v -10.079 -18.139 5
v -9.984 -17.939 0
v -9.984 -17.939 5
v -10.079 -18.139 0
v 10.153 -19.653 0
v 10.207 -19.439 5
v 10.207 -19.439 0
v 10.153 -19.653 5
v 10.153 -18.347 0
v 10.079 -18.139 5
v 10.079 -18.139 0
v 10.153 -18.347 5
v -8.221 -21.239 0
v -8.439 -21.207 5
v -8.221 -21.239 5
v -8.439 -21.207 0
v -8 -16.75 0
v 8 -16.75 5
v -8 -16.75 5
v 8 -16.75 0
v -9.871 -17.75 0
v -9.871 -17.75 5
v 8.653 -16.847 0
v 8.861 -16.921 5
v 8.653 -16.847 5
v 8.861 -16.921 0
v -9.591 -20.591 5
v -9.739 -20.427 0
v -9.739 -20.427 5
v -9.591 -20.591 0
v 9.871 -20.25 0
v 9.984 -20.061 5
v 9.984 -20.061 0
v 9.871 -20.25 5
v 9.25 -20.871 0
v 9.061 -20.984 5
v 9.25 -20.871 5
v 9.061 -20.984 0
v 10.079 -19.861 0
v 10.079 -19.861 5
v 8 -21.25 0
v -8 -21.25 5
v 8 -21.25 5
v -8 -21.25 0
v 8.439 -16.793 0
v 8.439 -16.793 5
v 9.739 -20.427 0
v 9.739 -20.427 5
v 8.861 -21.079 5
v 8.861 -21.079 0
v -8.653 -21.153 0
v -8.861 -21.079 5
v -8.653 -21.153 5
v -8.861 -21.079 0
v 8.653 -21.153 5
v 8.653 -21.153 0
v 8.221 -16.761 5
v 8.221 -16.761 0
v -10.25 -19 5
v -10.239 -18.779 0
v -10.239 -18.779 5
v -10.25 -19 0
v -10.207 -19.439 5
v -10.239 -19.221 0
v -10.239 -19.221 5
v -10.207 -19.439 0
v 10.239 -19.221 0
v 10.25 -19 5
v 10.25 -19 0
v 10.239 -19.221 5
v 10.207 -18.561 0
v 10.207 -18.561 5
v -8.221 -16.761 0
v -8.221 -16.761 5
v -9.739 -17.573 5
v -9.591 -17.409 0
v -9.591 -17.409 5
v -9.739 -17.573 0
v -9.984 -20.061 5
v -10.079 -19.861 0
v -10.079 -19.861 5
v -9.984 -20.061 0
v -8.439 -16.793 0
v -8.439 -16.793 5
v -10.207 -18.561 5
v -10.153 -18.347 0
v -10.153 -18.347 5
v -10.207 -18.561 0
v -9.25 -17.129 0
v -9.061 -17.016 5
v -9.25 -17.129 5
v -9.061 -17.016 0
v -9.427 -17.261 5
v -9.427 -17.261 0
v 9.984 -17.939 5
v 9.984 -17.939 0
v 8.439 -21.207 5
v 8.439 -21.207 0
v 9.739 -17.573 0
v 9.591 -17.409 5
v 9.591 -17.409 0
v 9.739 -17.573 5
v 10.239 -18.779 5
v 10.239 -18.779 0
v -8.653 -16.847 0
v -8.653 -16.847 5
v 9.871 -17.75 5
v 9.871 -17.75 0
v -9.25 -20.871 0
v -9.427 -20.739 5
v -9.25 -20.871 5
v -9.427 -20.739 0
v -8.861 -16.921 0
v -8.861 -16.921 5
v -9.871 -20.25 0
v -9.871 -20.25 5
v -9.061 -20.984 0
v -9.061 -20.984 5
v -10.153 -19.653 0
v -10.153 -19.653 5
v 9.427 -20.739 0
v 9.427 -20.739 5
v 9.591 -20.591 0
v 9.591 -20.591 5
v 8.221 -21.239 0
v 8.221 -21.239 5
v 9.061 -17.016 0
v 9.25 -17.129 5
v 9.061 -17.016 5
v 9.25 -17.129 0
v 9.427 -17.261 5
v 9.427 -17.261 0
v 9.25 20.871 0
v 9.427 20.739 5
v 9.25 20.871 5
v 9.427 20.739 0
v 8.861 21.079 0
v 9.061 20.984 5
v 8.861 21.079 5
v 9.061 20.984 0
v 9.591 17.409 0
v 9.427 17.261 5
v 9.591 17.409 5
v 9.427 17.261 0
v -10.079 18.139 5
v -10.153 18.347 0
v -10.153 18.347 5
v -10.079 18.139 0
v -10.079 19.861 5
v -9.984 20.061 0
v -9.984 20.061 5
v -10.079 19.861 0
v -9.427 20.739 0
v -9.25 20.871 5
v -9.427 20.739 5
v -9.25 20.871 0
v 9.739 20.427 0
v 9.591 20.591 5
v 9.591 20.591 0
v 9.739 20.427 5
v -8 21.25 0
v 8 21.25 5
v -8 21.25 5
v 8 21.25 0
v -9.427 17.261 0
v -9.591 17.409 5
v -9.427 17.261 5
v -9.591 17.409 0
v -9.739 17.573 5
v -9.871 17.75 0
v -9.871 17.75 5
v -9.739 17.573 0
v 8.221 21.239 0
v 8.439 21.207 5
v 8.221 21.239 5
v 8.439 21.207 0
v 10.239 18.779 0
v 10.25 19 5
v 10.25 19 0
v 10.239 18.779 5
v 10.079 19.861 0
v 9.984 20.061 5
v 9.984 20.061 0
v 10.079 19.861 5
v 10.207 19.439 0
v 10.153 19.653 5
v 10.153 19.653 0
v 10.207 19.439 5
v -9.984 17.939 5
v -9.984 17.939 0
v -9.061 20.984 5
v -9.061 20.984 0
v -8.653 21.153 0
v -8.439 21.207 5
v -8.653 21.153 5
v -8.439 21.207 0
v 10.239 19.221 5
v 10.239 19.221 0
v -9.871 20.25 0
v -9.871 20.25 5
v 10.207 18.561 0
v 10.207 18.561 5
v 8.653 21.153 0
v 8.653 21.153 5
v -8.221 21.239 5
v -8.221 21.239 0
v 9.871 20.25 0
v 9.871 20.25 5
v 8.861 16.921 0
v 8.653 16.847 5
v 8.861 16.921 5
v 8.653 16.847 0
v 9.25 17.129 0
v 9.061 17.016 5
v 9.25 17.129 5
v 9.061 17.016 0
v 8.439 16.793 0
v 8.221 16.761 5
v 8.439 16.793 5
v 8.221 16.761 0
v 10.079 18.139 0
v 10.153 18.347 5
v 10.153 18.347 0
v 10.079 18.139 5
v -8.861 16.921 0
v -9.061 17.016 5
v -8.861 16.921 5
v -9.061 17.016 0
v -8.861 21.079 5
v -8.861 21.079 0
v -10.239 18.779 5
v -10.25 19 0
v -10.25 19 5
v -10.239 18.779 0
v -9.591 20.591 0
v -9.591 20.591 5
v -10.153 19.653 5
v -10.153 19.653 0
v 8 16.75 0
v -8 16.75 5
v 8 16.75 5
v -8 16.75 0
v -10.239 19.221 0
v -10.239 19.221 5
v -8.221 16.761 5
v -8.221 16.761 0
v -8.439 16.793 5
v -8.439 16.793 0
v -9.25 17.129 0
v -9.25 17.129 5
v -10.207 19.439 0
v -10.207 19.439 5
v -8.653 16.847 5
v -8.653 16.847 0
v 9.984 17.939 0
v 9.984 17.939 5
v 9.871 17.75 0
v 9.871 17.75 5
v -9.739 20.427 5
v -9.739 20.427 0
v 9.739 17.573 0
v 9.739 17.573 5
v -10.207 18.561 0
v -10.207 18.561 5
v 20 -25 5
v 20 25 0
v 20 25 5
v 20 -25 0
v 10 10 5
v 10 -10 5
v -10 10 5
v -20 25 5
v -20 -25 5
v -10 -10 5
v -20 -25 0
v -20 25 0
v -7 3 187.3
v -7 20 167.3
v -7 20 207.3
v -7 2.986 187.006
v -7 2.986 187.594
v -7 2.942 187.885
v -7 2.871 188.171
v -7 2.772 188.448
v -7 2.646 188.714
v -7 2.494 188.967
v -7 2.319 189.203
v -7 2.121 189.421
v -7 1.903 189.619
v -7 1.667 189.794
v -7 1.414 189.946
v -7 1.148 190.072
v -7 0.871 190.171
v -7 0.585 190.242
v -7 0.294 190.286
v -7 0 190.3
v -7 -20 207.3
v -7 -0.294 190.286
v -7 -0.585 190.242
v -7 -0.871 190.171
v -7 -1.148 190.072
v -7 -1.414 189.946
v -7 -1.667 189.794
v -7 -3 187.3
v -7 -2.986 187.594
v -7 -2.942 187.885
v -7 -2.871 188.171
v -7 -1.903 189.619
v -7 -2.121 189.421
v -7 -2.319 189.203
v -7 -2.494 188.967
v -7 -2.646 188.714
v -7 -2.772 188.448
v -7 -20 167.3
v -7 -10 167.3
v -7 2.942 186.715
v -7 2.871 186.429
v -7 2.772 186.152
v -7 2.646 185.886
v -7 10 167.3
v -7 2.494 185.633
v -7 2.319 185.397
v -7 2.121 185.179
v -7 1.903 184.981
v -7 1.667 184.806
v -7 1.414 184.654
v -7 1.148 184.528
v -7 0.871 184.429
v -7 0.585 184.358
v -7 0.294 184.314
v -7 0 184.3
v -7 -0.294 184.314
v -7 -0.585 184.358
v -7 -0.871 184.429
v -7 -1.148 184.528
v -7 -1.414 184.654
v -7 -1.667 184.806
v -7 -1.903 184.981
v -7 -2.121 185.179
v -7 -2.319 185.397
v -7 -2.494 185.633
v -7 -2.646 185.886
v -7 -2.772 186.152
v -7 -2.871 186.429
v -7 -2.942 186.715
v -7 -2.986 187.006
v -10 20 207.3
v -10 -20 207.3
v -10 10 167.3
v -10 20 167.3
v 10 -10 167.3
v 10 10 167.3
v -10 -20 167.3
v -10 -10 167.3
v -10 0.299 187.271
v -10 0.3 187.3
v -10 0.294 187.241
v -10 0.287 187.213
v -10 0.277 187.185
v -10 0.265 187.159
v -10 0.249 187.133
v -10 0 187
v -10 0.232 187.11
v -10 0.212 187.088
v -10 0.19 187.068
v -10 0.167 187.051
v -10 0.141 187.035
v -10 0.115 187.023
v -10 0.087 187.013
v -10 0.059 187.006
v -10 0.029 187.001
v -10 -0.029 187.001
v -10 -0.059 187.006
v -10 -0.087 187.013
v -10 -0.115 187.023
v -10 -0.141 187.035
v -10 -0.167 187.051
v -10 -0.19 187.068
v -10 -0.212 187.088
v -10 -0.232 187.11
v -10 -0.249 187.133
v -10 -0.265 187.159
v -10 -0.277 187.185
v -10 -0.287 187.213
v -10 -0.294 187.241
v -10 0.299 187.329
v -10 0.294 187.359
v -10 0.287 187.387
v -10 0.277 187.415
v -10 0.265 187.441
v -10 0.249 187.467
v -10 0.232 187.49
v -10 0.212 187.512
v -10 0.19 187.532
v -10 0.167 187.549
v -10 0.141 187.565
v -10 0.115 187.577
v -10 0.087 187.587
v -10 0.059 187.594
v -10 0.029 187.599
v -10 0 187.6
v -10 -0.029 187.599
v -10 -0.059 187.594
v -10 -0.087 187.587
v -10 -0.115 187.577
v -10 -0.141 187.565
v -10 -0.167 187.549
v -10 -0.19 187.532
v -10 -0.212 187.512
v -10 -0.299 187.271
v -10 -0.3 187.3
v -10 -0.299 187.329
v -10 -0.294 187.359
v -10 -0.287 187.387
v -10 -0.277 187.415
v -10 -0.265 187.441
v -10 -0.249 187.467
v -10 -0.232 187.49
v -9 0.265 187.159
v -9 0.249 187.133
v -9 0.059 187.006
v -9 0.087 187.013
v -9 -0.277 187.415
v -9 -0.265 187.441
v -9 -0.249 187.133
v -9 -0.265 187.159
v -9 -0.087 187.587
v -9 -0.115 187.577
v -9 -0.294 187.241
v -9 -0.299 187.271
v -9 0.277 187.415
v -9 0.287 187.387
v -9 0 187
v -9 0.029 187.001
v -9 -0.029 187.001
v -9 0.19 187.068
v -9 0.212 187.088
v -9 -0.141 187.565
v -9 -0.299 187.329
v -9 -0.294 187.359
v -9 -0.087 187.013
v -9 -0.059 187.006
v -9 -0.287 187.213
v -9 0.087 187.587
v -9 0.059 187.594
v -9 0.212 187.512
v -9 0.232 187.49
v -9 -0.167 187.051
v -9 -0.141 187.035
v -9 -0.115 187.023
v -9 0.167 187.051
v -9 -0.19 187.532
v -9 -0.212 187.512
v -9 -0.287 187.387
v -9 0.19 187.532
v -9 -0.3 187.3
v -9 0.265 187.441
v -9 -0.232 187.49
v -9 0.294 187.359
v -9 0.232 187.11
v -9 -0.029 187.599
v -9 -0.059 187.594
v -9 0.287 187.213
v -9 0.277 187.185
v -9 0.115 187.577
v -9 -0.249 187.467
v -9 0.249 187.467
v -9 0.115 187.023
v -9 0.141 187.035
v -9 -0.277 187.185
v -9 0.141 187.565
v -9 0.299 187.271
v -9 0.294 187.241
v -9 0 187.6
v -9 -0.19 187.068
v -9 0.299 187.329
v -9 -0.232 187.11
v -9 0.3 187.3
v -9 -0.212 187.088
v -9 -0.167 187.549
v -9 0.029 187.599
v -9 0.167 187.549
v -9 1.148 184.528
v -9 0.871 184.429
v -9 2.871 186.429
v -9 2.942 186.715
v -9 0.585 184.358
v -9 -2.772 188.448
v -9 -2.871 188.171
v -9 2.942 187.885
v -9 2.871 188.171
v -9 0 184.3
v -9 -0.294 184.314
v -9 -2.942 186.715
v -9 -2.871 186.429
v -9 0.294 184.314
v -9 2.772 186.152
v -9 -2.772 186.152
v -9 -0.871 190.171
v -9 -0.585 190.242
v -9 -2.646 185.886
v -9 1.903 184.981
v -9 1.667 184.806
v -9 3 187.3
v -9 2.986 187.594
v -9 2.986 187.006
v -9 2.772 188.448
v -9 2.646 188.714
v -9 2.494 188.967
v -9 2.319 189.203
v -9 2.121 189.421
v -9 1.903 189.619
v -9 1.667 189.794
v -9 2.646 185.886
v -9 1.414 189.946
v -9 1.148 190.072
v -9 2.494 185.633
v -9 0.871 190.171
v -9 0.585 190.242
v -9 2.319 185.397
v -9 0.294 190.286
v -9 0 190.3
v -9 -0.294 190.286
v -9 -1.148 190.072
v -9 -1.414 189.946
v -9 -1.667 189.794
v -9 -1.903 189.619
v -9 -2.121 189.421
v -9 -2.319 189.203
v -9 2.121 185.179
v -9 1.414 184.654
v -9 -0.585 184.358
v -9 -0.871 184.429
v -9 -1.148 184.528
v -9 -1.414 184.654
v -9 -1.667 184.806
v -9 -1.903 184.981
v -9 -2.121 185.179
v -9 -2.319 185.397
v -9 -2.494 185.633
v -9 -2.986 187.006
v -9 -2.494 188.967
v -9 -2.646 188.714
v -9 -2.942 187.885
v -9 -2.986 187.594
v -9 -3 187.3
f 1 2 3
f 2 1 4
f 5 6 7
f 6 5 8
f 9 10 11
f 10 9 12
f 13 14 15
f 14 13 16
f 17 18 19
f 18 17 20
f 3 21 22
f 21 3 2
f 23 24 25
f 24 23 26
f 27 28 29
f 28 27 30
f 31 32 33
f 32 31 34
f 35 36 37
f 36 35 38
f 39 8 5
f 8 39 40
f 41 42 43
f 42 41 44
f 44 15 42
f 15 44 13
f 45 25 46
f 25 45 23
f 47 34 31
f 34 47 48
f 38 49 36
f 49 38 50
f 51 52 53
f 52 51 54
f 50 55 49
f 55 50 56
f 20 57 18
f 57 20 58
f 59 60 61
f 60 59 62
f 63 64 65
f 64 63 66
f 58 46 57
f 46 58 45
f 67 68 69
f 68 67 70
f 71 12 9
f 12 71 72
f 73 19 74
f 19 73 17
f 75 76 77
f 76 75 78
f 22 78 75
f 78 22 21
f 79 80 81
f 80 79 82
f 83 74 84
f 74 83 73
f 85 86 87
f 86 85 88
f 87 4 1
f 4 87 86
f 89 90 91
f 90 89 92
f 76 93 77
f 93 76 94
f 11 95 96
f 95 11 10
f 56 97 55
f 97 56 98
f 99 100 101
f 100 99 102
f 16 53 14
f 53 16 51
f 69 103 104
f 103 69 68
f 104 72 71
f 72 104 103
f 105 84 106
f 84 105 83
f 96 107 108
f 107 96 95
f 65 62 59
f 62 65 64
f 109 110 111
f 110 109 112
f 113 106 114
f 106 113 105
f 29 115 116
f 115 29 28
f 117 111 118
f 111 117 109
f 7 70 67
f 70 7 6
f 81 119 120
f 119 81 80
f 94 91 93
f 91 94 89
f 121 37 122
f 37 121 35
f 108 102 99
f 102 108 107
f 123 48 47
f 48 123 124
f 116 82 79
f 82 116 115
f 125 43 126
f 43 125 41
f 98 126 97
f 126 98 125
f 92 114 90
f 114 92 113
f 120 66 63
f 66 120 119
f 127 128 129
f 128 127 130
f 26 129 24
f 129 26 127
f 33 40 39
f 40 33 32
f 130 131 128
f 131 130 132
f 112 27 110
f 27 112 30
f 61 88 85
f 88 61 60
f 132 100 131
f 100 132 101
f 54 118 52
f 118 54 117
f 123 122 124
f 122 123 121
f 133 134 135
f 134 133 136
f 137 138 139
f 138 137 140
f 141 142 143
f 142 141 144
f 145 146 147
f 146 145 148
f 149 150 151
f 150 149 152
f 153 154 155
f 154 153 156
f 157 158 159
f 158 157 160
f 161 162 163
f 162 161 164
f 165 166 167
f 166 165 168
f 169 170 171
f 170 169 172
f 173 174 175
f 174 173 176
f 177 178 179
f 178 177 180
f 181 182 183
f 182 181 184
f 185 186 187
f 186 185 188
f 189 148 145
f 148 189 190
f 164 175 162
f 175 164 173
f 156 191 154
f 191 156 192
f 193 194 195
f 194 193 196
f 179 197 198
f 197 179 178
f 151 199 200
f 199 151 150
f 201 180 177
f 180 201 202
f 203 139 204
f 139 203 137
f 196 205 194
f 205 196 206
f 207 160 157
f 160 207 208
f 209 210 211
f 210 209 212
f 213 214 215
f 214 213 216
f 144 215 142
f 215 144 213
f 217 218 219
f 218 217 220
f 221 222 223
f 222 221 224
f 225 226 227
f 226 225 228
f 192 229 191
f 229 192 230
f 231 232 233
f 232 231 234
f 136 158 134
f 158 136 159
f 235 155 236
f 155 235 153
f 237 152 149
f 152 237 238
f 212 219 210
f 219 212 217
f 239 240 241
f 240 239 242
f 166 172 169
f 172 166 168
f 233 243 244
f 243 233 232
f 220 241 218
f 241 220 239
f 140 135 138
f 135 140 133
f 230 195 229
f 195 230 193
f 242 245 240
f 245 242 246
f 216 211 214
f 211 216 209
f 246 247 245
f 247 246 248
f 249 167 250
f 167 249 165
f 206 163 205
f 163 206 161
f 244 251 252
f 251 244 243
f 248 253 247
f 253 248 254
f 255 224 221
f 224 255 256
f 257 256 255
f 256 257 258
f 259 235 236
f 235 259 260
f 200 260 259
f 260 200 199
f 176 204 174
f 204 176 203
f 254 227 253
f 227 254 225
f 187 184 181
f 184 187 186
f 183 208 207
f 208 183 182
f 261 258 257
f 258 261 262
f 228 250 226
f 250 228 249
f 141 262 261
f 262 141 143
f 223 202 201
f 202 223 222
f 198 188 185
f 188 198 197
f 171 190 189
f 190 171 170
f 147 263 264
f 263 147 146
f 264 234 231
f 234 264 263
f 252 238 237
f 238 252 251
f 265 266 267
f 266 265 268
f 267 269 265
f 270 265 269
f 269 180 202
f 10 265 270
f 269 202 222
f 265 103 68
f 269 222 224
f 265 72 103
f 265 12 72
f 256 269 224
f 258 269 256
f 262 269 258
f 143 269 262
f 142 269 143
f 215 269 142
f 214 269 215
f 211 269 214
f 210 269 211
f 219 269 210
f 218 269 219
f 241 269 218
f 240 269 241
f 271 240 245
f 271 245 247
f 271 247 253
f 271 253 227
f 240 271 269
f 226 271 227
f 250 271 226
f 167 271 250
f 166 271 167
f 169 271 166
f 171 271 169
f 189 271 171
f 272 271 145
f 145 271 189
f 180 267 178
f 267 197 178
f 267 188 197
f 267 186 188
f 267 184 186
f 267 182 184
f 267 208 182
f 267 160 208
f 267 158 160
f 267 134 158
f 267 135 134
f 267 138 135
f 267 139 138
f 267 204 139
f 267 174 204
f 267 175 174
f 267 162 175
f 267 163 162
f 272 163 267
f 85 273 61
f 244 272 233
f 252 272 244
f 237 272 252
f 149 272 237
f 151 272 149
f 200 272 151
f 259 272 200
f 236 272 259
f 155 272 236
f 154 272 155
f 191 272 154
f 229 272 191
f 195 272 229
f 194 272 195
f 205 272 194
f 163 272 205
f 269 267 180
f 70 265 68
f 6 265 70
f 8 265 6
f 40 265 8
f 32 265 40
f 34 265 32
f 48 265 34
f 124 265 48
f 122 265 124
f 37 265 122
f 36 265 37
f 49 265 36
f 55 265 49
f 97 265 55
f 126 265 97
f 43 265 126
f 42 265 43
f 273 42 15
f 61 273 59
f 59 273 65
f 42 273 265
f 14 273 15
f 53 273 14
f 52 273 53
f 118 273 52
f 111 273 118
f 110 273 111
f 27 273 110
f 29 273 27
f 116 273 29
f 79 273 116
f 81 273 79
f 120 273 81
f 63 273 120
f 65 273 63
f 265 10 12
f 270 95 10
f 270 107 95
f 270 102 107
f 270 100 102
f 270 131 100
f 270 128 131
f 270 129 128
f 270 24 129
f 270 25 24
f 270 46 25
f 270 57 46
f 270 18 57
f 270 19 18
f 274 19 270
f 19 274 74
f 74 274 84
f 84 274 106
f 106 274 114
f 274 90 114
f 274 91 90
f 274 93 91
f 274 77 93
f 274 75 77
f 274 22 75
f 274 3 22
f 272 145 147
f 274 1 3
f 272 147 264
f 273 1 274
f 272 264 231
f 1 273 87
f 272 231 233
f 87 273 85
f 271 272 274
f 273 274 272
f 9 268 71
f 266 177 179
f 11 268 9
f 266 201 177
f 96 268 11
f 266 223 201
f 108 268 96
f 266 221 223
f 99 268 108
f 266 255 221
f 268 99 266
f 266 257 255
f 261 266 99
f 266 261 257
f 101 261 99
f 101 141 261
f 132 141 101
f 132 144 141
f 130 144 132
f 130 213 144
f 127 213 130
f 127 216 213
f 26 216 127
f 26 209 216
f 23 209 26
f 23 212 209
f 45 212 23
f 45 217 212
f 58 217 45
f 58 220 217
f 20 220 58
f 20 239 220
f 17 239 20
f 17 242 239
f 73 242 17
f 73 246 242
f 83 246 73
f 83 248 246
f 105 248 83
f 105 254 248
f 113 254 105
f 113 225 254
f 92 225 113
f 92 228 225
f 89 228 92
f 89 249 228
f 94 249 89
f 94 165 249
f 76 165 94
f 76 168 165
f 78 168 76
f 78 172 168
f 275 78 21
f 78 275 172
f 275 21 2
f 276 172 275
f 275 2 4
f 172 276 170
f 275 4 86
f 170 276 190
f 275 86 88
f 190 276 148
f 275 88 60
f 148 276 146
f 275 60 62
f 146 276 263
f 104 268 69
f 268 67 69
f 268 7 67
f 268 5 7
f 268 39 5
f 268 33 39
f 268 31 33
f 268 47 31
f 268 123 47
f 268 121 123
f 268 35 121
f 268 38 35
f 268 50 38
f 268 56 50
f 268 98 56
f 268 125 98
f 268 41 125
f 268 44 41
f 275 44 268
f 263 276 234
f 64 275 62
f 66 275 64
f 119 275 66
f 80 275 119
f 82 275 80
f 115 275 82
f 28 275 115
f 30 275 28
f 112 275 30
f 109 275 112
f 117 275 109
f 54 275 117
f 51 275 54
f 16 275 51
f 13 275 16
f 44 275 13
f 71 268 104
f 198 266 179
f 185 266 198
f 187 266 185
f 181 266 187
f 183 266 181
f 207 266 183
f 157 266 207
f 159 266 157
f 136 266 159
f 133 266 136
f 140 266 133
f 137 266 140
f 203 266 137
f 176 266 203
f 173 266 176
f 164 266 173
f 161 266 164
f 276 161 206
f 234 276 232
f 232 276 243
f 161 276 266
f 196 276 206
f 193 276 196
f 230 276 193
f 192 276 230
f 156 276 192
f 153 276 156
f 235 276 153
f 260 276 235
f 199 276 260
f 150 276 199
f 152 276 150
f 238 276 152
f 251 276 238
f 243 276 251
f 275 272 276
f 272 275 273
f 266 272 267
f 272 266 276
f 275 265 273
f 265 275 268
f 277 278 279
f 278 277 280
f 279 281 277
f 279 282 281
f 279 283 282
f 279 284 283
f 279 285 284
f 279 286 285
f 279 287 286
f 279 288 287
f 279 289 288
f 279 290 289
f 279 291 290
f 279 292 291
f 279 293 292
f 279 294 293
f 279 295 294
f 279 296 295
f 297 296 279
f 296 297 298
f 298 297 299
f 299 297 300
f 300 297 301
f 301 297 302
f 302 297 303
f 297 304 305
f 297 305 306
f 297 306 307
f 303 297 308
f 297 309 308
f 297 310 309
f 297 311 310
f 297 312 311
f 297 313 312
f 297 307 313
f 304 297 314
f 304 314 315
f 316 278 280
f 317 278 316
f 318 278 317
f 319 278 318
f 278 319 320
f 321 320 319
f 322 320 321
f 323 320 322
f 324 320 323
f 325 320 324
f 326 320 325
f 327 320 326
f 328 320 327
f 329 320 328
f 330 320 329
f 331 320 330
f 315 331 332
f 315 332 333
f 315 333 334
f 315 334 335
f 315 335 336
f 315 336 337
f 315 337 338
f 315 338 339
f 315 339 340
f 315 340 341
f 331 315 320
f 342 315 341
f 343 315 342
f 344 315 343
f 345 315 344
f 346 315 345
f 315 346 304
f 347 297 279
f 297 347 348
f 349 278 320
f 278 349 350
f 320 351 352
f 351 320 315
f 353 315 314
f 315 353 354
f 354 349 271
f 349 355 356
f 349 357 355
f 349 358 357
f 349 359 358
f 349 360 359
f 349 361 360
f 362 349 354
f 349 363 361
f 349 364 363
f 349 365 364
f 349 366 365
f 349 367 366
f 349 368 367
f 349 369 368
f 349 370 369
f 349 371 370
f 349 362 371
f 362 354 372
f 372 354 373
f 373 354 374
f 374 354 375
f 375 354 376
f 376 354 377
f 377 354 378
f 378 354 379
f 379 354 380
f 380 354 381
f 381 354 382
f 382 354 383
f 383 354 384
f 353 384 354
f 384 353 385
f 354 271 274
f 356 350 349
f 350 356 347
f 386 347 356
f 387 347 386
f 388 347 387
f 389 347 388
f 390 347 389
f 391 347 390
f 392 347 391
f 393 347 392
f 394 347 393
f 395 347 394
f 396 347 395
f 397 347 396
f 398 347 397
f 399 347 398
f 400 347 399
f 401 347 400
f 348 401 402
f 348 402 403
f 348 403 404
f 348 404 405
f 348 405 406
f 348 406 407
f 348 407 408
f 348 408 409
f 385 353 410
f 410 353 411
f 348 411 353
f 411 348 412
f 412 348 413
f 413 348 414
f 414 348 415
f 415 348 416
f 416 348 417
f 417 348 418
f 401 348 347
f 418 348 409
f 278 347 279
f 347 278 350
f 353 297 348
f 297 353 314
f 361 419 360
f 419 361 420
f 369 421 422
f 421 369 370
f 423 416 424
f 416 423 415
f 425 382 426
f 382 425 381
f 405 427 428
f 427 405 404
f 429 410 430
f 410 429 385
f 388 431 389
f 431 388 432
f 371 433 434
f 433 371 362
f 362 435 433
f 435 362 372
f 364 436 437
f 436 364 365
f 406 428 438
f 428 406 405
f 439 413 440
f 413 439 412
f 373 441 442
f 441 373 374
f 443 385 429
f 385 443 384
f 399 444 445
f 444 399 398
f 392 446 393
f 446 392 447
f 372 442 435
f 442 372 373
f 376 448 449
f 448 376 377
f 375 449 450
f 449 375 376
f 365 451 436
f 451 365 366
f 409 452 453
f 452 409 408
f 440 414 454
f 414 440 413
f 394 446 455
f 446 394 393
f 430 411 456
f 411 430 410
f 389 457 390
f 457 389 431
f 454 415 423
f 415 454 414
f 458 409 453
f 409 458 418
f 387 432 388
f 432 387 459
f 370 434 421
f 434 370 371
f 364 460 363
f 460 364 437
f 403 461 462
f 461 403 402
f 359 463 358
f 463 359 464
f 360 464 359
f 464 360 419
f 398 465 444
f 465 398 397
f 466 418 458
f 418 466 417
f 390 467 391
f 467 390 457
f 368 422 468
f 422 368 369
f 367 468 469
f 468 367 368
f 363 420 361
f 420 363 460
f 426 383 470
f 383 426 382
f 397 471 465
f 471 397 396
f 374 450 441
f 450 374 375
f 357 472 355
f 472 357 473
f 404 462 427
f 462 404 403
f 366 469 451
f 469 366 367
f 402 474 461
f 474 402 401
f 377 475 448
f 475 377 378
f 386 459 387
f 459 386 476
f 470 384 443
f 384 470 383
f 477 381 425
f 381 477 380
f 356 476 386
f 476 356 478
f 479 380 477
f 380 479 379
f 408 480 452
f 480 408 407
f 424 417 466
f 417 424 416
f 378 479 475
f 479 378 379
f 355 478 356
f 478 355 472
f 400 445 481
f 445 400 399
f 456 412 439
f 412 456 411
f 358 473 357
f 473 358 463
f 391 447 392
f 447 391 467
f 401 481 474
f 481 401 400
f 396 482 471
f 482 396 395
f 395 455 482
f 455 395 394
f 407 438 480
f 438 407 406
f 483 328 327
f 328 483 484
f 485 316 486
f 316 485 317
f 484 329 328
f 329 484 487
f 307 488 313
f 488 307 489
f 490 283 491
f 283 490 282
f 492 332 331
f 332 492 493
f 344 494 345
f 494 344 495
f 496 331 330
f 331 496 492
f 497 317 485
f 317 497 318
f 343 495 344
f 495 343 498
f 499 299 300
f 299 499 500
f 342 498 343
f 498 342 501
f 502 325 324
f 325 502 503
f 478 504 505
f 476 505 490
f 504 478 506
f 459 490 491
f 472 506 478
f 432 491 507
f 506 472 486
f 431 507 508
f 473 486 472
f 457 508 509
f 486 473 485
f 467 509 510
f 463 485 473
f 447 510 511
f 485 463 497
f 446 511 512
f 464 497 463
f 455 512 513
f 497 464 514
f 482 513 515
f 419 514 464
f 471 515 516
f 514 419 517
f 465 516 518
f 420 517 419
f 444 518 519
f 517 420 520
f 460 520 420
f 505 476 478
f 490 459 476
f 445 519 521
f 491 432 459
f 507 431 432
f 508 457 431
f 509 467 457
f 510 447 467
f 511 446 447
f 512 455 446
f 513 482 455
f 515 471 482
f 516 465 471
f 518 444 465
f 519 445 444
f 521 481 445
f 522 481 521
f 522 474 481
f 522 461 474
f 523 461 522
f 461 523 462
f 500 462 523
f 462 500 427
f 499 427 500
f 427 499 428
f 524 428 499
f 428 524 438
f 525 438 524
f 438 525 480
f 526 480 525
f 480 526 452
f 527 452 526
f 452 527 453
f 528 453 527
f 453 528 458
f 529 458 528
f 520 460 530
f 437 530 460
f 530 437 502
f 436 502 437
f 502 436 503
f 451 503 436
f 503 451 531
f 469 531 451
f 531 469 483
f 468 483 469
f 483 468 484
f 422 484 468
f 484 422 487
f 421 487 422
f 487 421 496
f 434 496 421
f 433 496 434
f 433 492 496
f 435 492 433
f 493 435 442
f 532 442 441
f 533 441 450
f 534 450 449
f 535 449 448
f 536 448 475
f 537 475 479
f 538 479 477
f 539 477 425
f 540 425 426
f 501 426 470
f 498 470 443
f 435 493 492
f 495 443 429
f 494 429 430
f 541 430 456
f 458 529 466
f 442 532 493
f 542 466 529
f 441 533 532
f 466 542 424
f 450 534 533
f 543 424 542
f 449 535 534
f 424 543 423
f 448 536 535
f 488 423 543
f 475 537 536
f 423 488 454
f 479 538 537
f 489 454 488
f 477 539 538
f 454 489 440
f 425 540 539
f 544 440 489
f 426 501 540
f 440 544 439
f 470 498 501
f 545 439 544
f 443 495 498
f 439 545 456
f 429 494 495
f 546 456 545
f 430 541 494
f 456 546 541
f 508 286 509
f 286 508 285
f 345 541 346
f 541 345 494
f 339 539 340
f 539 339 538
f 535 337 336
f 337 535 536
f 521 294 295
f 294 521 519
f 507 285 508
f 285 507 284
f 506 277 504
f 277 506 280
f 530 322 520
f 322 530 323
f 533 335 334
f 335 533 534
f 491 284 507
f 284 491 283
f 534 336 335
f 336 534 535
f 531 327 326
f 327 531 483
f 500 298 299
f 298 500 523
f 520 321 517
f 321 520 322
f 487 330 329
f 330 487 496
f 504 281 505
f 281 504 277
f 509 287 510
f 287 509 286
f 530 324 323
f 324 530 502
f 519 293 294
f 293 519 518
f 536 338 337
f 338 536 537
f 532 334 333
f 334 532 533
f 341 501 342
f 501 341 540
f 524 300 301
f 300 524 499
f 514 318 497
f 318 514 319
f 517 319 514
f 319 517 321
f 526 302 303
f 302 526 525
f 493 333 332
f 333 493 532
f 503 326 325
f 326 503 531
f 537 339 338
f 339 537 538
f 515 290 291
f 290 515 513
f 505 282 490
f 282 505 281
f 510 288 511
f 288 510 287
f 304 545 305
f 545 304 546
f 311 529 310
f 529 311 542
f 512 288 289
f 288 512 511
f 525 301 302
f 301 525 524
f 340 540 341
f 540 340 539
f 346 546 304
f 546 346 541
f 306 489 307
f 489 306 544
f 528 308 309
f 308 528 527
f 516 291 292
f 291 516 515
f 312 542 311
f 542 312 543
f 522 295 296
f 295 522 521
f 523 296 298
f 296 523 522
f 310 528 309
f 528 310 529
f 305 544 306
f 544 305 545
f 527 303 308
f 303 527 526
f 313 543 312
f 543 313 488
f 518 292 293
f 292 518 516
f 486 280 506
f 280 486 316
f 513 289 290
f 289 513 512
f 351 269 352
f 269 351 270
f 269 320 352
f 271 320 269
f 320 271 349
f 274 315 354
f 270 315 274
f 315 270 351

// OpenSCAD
// stands.scad: the 3D-printed parts of the beam-walking bench (OpenSCAD; mm). Print in PLA, 0.2 mm layers,
// 4 perimeters, 40 % infill, each standing on its foot. Pick a part with -D 'part="aperture"' (or laser, photodiode).
//   openscad -D 'part="aperture"' -o aperture.stl stands.scad    (print two)
// Heights are from the top of the 1/2 in (12.7 mm) board; the beam runs 187.3 mm above it (200 mm above the bench).
// Each foot is screwed to the board with two 4 mm wood screws through its slots.

part = "aperture";
BEAM = 187.3;          // beam height above the board
$fn = 64;

module foot() {        // 40 (along the beam) x 50 x 5 mm, two slots for 4 mm wood screws
    difference() {
        translate([-20, -25, 0]) cube([40, 50, 5]);
        for (y = [-19, 19]) hull() for (x = [-8, 8]) translate([x, y, -1]) cylinder(d = 4.5, h = 7);
    }
}

module column(top) { translate([-10, -10, 0]) cube([20, 20, top]); }

// Alignment aperture: a 40 x 40 x 3 mm plate (print in white PLA, so the red spot shows) with its hole centre at the
// beam height. The hole is printed as a 0.6 mm pilot and drilled through with a 0.8 mm bit (a standard PCB drill); a
// Ø6 mm counterbore from the back leaves the plate 1 mm thick at the hole. The plate's front face (toward M2) is at
// x = -10, flush with the column's front.
module aperture() {
    foot();
    column(BEAM - 20);
    difference() {
        translate([-10, -20, BEAM - 20]) cube([3, 40, 40]);
        translate([-11, 0, BEAM]) rotate([0, 90, 0]) cylinder(d = 0.6, h = 5);
        translate([-9, 0, BEAM]) rotate([0, 90, 0]) cylinder(d = 6, h = 5);
    }
}

// Laser holder: a 16 x 20 x 20 mm block on the column, a Ø9.2 mm bore along x at the beam height for the
// Ø9 x 20 mm module, an M3 grub-screw hole from the top to clamp it (tap the plastic or use an M3 heat-set insert).
module laser() {
    foot();
    column(BEAM - 10);
    difference() {
        translate([-8, -10, BEAM - 10]) cube([16, 20, 20]);
        translate([-9, 0, BEAM]) rotate([0, 90, 0]) cylinder(d = 9.2, h = 18);
        translate([0, 0, BEAM]) cylinder(d = 2.5, h = 11);
    }
}

// Photodiode holder (print in black PLA): a 16 x 25 x 25 mm block; a 5.6 x 4.6 mm pocket, 2 mm deep, in its front face
// (toward aperture 2) takes the BPW34 with its 2.65 mm square active area centred on the beam; two Ø1.2 mm holes take
// its leads (5.08 mm apart) out of the back to the multimeter leads. A light shroud, a tube 16 mm outside and 10 mm
// inside, 31 mm long, runs from the block's front to 1 mm behind aperture 2's plate, so room light can't reach the
// photodiode (the holder's front is 32 mm behind the plate's back).
module photodiode() {
    foot();
    column(BEAM - 12.5);
    difference() {
        translate([-39, 0, BEAM]) rotate([0, 90, 0]) cylinder(d = 16, h = 32);
        translate([-40, 0, BEAM]) rotate([0, 90, 0]) cylinder(d = 10, h = 34);
    }
    difference() {
        translate([-8, -12.5, BEAM - 12.5]) cube([16, 25, 25]);
        translate([-9, -2.8, BEAM - 2.3]) cube([3, 5.6, 4.6]);
        for (y = [-2.54, 2.54]) translate([-9, y, BEAM - 3.5]) rotate([0, 90, 0]) cylinder(d = 1.2, h = 20);
    }
}

if (part == "aperture") aperture();
if (part == "laser") laser();
if (part == "photodiode") photodiode();
